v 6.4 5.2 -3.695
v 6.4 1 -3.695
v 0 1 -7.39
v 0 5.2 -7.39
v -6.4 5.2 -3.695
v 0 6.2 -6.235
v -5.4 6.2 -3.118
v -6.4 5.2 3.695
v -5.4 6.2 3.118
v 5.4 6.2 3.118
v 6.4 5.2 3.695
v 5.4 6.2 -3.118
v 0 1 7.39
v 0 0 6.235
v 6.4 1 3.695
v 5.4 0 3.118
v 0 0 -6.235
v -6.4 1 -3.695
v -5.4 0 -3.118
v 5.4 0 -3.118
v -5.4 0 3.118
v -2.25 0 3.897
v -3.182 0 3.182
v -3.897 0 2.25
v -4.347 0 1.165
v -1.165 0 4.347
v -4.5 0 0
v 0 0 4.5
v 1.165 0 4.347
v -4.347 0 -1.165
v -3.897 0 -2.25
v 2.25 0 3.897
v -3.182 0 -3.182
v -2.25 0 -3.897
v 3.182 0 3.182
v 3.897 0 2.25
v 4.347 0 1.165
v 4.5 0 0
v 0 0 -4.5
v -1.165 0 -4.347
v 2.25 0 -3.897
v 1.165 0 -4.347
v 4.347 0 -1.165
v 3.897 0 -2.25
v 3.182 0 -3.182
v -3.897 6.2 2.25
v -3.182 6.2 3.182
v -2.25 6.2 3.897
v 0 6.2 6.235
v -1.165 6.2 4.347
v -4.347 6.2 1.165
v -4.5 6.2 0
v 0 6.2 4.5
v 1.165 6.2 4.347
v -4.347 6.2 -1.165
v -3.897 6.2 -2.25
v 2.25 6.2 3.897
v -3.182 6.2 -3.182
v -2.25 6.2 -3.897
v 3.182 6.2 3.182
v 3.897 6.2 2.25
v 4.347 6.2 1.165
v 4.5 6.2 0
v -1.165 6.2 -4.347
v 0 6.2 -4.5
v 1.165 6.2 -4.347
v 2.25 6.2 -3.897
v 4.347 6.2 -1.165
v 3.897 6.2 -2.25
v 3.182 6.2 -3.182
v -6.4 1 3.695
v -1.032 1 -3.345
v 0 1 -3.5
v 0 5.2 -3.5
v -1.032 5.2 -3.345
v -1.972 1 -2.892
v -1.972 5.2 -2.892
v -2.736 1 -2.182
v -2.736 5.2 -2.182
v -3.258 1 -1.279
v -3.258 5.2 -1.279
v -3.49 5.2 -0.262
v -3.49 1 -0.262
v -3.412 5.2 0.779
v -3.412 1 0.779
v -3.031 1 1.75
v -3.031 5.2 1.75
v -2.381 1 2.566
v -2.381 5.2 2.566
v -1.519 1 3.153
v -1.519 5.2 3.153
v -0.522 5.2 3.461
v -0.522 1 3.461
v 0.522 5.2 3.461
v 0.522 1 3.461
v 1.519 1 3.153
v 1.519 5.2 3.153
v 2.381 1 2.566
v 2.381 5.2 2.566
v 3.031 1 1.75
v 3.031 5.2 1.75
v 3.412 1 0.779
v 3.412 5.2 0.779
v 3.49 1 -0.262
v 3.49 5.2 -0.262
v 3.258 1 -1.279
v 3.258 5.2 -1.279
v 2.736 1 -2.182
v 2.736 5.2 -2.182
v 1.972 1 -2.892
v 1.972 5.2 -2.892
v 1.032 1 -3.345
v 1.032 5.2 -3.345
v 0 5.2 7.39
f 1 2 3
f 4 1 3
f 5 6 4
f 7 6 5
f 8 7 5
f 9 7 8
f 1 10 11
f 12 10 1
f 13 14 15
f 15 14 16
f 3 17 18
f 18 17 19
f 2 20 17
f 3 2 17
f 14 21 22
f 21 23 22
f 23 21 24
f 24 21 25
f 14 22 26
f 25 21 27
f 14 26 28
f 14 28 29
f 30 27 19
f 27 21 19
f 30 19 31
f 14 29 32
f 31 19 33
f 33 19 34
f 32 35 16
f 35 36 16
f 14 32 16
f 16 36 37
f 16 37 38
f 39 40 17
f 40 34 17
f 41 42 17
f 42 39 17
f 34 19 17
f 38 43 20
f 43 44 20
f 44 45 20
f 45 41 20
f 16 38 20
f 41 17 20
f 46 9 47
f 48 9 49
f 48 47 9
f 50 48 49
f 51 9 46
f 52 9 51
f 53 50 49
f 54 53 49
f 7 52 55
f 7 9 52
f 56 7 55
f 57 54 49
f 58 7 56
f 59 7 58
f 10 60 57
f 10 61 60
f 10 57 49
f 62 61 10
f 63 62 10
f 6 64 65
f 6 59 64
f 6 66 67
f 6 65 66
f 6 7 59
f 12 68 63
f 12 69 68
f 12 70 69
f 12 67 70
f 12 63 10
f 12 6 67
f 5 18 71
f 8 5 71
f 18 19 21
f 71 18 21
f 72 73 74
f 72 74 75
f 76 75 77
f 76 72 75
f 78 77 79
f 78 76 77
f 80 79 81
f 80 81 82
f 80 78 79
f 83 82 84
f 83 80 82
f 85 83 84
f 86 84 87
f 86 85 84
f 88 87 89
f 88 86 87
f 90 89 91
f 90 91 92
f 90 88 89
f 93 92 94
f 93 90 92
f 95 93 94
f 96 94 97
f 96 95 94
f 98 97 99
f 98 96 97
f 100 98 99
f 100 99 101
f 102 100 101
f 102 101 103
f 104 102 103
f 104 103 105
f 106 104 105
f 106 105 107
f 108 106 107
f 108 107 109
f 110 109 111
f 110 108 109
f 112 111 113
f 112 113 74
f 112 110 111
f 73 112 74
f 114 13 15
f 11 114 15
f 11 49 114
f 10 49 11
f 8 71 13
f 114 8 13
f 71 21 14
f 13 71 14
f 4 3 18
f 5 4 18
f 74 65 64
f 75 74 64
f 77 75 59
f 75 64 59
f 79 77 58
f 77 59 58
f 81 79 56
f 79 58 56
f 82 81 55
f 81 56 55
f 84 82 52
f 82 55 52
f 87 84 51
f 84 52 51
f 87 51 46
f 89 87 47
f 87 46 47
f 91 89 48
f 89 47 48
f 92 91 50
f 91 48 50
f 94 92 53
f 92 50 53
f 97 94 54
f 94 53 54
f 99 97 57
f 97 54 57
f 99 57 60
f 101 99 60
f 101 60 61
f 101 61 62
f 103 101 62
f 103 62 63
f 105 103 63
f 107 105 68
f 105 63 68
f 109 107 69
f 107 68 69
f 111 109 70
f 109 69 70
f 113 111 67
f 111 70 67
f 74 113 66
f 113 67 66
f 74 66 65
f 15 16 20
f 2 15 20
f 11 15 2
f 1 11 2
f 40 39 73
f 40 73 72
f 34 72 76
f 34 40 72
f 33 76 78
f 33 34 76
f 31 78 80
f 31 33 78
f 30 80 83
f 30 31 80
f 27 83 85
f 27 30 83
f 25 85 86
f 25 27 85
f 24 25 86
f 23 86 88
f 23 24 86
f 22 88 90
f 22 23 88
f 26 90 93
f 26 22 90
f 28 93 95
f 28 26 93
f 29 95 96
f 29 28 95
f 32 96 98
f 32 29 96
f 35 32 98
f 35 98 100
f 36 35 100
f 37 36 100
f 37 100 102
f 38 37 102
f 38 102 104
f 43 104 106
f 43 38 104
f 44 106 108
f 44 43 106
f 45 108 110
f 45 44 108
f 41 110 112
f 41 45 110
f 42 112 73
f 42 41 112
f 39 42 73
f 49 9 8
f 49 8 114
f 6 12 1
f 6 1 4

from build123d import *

# Parameters (mm, degrees)
SKETCH1_R           = 3.5
BOSS_EXTRUDE1_DEPTH = 6.2
CHAMFER1_SIZE       = 1


with BuildPart() as part:
    # Sketch1 → Boss-Extrude1 (new body)
    with BuildSketch(Plane(origin=(0, 0, 0), x_dir=(1, 0, 0), z_dir=(0, 1, 0))):
        Polygon((6.4, -3.695041723), (6.4, 3.695041723), (0, 7.390083446), (-6.4, 3.695041723), (-6.4, -3.695041723), (0, -7.390083446), align=None)
        with Locations(Location((0, 0, 0), (0, 0, 90))):
            Circle(SKETCH1_R, mode=Mode.SUBTRACT)
    extrude(amount=BOSS_EXTRUDE1_DEPTH)

    # Chamfer1
    chamfer1_edges = [part.edges().sort_by_distance(p)[0] for p in [
        (3.2, 6.2, -5.542562584),
        (-3.2, 6.2, -5.542562584),
        (-6.4, 6.2, 0),
        (0, 0, 3.5),
        (0, 6.2, 3.5),
        (-3.2, 6.2, 5.542562584),
        (3.2, 6.2, 5.542562584),
        (-3.2, 0, 5.542562584),
        (-6.4, 0, 0),
        (-3.2, 0, -5.542562584),
        (6.4, 6.2, 0),
        (3.2, 0, -5.542562584),
        (6.4, 0, 0),
        (3.2, 0, 5.542562584),
    ]]
    chamfer(chamfer1_edges, length=CHAMFER1_SIZE)


solid = part.part
